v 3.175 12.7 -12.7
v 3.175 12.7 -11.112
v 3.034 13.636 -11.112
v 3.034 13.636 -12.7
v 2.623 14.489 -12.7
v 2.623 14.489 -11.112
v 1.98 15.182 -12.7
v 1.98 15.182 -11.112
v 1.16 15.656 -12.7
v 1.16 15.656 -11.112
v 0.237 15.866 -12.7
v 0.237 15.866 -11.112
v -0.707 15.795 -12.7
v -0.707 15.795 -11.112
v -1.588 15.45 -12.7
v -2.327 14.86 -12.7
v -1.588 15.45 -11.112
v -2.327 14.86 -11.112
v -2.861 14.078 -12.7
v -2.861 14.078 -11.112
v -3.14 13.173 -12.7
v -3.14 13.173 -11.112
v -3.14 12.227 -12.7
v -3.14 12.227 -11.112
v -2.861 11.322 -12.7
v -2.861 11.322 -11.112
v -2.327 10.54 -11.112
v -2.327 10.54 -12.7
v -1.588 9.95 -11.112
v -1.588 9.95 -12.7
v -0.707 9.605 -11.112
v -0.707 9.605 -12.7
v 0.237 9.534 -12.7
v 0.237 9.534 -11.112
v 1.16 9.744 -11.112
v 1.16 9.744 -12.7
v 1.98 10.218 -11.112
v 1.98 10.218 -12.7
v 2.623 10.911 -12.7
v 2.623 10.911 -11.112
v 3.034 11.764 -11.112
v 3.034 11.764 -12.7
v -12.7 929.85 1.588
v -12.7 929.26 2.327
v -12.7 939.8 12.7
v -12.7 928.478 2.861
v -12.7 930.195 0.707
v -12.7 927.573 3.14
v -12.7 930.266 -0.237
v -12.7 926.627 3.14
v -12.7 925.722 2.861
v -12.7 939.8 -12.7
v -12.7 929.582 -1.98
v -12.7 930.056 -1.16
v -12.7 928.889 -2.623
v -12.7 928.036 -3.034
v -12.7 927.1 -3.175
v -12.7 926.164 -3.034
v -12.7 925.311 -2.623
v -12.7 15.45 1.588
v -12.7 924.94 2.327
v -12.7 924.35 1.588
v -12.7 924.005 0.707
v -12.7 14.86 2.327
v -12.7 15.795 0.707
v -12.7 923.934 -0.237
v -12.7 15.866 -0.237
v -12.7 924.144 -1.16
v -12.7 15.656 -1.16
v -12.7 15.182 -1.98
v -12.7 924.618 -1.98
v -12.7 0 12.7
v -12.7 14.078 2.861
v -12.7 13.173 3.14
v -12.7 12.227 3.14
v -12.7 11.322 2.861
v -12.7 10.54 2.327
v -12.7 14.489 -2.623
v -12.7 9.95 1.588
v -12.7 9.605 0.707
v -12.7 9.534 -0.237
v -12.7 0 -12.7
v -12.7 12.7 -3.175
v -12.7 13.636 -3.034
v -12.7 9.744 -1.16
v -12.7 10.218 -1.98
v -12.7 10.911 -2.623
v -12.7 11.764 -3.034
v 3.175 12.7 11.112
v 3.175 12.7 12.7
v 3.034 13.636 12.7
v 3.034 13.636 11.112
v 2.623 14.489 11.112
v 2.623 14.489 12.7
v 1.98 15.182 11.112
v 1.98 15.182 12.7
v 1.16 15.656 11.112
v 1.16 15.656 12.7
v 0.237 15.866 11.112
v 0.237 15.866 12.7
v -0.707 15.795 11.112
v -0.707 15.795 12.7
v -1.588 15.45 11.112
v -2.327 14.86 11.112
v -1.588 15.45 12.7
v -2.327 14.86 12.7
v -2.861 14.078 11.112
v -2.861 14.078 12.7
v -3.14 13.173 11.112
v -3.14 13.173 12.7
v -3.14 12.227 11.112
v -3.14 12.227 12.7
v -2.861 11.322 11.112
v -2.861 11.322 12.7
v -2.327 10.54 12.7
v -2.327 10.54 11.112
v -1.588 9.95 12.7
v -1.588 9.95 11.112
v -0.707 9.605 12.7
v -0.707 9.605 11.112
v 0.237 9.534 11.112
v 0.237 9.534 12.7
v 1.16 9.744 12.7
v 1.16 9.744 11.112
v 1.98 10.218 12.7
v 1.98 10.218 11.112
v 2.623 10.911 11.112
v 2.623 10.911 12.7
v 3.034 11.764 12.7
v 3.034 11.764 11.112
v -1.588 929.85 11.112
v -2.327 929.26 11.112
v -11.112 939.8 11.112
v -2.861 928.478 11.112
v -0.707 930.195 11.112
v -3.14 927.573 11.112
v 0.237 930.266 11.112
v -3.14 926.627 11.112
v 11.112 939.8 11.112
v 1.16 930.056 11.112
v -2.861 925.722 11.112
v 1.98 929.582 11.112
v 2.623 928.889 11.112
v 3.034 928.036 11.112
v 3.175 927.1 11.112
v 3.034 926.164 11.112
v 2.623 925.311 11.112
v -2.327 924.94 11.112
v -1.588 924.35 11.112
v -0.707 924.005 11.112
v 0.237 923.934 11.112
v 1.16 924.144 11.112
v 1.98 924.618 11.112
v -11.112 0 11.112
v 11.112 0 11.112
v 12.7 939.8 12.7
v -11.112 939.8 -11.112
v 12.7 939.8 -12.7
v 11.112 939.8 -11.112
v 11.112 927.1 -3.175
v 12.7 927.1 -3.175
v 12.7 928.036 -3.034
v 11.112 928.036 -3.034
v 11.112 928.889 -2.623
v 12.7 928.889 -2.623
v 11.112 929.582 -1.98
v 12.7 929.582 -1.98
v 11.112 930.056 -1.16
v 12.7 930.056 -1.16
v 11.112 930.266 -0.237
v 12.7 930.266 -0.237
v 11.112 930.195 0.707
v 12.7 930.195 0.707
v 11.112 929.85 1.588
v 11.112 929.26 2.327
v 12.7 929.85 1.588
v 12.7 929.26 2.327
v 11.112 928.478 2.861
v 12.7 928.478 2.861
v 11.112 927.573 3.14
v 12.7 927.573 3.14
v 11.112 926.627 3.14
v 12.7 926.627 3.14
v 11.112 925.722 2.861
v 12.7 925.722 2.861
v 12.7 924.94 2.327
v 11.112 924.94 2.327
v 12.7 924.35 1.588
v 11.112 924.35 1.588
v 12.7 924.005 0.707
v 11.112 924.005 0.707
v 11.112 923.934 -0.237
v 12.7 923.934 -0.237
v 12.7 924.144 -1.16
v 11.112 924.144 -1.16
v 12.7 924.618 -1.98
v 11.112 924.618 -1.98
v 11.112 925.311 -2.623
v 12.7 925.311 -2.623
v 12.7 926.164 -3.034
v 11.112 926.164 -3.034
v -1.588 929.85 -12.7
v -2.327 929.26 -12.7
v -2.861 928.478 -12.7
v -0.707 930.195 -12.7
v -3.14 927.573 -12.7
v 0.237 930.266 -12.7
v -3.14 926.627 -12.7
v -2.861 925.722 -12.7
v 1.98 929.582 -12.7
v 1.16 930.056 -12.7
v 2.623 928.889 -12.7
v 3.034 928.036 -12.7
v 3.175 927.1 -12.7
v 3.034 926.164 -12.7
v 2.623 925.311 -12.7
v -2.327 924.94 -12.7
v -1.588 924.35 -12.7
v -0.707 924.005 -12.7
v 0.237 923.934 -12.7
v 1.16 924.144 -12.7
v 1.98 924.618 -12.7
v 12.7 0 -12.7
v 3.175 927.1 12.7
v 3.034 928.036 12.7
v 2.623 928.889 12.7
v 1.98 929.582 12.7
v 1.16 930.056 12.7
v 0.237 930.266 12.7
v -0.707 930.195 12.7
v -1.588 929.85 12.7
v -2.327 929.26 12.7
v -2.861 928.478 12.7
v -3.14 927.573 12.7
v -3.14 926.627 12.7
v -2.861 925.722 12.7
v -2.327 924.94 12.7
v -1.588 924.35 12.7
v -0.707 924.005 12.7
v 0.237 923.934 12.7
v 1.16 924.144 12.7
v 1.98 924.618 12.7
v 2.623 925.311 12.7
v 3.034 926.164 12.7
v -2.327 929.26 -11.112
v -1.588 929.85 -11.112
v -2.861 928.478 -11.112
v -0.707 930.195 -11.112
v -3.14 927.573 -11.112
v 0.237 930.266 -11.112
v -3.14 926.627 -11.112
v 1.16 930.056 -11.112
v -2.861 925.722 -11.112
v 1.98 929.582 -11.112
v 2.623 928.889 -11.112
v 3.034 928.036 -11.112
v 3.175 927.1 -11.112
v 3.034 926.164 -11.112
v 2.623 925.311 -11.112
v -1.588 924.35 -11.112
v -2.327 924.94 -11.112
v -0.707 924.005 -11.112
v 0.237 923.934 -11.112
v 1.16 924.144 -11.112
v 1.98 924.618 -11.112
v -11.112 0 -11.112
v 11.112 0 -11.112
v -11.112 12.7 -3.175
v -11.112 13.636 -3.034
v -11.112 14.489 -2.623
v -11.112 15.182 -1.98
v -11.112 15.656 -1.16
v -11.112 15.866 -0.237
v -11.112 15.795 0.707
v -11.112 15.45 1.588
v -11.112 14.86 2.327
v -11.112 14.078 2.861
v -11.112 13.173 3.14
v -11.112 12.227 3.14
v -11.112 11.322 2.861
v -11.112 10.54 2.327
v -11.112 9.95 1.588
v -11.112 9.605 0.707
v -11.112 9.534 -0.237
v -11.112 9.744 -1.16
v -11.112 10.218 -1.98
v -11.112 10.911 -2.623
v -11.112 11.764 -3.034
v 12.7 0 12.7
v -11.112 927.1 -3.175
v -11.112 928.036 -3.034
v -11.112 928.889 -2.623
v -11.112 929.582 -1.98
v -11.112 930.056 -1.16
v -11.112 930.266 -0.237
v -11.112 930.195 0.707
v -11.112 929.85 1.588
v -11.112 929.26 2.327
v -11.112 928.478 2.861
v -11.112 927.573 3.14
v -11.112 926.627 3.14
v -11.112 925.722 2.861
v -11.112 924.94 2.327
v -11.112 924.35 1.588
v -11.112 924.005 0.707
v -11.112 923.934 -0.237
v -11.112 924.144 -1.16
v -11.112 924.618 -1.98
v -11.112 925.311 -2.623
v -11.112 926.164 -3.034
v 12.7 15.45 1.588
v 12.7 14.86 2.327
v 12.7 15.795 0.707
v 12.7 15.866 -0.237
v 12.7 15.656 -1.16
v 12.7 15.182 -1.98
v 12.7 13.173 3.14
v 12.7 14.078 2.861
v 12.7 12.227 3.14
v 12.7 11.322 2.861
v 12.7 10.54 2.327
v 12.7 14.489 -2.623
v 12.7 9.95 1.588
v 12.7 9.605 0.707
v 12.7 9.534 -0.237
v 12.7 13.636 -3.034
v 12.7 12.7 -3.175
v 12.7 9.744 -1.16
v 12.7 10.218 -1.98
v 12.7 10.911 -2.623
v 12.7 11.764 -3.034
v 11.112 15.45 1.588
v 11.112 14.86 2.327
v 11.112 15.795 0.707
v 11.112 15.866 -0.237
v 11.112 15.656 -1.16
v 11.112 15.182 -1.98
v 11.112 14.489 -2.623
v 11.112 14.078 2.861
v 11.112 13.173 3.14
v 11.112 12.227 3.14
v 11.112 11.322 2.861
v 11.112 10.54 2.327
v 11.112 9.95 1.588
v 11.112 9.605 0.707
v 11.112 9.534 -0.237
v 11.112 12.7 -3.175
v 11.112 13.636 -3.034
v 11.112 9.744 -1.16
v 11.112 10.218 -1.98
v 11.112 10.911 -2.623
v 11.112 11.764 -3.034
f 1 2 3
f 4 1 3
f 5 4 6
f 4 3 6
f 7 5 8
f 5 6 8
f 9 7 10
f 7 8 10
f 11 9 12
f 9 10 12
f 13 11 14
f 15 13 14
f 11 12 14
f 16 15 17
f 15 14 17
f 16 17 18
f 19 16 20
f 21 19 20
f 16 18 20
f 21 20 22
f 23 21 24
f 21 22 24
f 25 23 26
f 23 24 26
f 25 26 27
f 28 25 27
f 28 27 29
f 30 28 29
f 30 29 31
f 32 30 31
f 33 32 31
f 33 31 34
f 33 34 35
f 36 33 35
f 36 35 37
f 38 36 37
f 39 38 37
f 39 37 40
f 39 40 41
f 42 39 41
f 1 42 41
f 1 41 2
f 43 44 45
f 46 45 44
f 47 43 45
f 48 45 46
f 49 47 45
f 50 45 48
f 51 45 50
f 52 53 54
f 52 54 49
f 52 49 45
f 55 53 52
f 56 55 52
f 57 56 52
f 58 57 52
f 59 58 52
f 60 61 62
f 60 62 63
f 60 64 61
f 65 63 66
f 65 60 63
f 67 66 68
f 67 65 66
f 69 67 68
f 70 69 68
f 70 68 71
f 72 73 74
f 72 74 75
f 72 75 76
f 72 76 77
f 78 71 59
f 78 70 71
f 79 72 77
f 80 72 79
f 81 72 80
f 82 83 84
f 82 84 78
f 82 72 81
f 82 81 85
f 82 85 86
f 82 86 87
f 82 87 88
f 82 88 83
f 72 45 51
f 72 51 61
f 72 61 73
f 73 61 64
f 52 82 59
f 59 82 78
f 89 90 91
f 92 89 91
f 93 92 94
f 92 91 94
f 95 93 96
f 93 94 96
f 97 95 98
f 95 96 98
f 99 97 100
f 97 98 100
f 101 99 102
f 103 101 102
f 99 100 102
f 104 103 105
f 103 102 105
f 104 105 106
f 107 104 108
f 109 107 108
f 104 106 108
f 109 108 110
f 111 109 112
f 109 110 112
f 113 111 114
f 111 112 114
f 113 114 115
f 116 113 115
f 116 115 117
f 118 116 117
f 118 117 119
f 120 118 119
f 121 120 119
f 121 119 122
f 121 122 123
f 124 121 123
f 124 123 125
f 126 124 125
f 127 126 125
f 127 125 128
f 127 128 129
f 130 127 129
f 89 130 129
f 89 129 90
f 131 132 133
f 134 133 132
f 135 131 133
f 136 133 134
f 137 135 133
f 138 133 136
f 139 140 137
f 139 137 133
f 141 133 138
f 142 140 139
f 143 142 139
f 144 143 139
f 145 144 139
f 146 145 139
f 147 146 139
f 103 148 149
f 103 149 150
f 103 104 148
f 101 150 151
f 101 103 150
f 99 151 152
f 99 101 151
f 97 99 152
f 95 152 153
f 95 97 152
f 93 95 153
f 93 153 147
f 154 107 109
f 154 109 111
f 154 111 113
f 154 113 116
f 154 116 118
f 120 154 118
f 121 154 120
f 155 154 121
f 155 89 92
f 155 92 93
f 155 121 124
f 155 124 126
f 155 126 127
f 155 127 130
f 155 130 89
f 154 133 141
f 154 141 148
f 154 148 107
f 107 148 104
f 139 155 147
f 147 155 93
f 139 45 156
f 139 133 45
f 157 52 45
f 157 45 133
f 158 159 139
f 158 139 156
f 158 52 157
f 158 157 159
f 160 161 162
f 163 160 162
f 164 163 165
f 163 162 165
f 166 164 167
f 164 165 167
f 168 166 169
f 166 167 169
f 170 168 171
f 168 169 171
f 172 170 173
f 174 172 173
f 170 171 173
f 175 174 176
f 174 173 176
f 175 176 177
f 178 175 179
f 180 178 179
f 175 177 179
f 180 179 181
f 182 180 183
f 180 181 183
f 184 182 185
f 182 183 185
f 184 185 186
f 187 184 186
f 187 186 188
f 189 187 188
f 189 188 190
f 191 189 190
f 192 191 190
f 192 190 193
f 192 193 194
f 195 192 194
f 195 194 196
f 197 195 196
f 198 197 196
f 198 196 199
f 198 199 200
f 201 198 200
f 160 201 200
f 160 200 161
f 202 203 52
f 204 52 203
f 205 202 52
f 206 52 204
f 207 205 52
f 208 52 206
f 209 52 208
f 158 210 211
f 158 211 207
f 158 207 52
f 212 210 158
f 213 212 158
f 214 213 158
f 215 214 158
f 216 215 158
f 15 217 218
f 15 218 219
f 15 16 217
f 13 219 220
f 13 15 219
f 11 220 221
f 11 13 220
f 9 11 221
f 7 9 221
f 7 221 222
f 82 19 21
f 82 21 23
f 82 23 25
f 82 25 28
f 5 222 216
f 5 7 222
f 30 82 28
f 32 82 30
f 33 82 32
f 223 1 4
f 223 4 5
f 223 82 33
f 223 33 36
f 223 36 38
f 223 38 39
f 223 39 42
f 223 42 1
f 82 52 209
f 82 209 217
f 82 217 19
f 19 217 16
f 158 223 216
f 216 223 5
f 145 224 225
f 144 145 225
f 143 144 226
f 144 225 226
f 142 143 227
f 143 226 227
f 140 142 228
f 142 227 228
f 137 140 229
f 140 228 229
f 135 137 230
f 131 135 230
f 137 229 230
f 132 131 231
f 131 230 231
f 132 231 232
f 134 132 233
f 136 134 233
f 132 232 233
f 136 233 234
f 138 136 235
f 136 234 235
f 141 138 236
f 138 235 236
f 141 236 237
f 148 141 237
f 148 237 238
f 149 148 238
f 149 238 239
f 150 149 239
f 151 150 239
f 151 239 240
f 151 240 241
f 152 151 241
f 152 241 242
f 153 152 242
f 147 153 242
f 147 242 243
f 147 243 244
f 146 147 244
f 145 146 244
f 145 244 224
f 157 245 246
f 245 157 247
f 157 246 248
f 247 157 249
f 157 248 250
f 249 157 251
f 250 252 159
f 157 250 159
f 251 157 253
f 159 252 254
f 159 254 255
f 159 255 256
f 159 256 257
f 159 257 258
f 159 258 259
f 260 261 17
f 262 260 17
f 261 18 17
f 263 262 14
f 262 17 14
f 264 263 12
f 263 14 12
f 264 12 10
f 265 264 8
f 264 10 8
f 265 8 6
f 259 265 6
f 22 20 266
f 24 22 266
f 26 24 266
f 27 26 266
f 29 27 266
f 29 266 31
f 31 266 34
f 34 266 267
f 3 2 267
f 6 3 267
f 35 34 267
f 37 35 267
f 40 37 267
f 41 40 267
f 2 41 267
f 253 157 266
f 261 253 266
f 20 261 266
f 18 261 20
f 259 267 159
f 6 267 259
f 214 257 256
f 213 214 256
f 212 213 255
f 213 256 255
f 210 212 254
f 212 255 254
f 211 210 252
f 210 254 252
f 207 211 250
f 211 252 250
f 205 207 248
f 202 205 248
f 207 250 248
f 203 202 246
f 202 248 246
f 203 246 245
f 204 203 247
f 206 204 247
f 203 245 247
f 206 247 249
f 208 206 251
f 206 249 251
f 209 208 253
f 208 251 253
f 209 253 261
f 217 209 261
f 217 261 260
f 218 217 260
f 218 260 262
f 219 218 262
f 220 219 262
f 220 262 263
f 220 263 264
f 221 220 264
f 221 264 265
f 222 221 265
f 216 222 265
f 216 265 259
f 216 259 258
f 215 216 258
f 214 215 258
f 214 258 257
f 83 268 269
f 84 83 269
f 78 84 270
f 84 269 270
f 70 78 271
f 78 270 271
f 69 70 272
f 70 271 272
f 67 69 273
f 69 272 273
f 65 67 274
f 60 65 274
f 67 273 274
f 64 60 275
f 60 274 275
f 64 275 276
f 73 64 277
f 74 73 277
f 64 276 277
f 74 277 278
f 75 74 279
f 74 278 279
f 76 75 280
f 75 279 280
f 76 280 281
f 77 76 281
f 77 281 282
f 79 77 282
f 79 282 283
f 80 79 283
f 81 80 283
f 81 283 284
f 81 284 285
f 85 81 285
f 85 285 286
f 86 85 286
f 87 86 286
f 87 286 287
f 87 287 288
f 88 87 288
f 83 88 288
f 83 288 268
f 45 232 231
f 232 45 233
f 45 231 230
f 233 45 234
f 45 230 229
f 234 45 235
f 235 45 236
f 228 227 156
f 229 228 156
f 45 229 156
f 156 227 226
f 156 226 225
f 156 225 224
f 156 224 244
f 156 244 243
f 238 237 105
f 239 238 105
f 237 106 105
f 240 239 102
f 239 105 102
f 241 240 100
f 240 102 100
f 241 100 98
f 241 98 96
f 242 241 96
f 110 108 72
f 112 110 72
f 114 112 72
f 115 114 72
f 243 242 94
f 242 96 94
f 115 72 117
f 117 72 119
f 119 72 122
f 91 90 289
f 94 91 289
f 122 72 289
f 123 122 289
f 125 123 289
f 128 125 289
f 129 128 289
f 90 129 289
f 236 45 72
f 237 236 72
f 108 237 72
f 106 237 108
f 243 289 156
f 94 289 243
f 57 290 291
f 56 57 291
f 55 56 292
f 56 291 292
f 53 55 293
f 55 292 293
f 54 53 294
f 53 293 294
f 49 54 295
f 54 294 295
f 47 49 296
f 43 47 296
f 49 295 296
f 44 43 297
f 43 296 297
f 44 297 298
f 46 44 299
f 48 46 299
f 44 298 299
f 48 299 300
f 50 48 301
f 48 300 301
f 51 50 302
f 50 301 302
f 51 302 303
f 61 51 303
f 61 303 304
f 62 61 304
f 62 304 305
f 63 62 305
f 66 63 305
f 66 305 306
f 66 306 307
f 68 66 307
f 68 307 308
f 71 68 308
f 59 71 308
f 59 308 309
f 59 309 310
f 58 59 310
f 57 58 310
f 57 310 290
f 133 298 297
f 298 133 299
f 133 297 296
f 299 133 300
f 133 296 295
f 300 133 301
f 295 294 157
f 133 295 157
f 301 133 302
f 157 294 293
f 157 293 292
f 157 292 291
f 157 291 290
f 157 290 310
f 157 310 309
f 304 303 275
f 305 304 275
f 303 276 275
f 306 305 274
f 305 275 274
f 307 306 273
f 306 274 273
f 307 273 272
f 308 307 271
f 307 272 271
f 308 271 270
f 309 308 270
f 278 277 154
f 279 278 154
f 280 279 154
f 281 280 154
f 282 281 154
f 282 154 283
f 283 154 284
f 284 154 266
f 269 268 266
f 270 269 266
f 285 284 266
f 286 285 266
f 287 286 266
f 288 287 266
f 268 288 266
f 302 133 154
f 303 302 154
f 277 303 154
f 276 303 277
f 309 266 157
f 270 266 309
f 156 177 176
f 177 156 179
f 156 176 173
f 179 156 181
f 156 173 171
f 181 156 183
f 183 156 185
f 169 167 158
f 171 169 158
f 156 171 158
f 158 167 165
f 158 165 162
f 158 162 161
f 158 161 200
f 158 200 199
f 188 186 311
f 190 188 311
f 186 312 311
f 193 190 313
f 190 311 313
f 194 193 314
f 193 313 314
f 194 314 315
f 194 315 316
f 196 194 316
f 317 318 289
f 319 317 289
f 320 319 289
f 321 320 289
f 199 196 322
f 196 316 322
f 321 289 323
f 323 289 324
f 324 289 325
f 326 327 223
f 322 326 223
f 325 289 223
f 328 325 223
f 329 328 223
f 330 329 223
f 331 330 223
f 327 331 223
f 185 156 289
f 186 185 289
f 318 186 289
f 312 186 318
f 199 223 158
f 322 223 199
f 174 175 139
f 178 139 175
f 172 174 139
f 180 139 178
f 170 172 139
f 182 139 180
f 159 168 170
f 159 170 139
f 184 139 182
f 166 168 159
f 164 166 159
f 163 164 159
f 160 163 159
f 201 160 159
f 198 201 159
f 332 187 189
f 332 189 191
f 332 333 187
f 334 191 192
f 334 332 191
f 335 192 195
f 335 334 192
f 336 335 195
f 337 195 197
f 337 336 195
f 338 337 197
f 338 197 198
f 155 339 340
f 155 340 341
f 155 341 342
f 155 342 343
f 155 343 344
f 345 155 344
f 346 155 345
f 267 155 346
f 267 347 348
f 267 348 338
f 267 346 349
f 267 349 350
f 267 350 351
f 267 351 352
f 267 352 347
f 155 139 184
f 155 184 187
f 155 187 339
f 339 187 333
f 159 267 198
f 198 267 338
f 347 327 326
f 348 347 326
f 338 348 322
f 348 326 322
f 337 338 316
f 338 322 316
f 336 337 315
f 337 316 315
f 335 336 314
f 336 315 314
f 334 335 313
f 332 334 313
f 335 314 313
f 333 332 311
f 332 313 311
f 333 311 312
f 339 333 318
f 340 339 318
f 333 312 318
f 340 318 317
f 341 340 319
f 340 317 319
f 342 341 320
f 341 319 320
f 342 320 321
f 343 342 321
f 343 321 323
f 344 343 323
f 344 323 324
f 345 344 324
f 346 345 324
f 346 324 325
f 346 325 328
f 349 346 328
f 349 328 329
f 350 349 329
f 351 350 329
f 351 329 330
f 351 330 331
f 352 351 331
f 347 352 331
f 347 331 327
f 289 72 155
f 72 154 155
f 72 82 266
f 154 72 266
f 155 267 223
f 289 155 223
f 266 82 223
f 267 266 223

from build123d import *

# Parameters (mm, degrees)
SKETCH1_W           = 25.4
SKETCH1_H           = 25.4
SKETCH1_W_2         = 22.225
SKETCH1_H_2         = 22.225
BOSS_EXTRUDE1_DEPTH = 939.8
SKETCH2_R           = 3.175
CUT_EXTRUDE1_DEPTH  = 26.4
SKETCH3_R           = 3.175
CUT_EXTRUDE2_DEPTH  = 26.4


with BuildPart() as part:
    # Sketch1 → Boss-Extrude1 (new body)
    with BuildSketch(Plane(origin=(0, 0, 0), x_dir=(1, 0, 0), z_dir=(0, 1, 0))):
        Rectangle(SKETCH1_W, SKETCH1_H)
        Rectangle(SKETCH1_W_2, SKETCH1_H_2, mode=Mode.SUBTRACT)
    extrude(amount=BOSS_EXTRUDE1_DEPTH)

    # Sketch2 → Cut-Extrude1 (cut, through all)
    with BuildSketch(Plane(origin=(12.7, 0, 0), x_dir=(0, 0, -1), z_dir=(1, 0, 0))):
        with Locations((0, 12.7)):
            Circle(SKETCH2_R)
        with Locations((0, 927.1)):
            Circle(SKETCH2_R)
    extrude(amount=-CUT_EXTRUDE1_DEPTH, mode=Mode.SUBTRACT)

    # Sketch3 → Cut-Extrude2 (cut, through all)
    with BuildSketch(Plane.XY.offset(12.7)):
        with Locations((0, 12.7)):
            Circle(SKETCH3_R)
        with Locations((0, 927.1)):
            Circle(SKETCH3_R)
    extrude(amount=-CUT_EXTRUDE2_DEPTH, mode=Mode.SUBTRACT)


solid = part.part
